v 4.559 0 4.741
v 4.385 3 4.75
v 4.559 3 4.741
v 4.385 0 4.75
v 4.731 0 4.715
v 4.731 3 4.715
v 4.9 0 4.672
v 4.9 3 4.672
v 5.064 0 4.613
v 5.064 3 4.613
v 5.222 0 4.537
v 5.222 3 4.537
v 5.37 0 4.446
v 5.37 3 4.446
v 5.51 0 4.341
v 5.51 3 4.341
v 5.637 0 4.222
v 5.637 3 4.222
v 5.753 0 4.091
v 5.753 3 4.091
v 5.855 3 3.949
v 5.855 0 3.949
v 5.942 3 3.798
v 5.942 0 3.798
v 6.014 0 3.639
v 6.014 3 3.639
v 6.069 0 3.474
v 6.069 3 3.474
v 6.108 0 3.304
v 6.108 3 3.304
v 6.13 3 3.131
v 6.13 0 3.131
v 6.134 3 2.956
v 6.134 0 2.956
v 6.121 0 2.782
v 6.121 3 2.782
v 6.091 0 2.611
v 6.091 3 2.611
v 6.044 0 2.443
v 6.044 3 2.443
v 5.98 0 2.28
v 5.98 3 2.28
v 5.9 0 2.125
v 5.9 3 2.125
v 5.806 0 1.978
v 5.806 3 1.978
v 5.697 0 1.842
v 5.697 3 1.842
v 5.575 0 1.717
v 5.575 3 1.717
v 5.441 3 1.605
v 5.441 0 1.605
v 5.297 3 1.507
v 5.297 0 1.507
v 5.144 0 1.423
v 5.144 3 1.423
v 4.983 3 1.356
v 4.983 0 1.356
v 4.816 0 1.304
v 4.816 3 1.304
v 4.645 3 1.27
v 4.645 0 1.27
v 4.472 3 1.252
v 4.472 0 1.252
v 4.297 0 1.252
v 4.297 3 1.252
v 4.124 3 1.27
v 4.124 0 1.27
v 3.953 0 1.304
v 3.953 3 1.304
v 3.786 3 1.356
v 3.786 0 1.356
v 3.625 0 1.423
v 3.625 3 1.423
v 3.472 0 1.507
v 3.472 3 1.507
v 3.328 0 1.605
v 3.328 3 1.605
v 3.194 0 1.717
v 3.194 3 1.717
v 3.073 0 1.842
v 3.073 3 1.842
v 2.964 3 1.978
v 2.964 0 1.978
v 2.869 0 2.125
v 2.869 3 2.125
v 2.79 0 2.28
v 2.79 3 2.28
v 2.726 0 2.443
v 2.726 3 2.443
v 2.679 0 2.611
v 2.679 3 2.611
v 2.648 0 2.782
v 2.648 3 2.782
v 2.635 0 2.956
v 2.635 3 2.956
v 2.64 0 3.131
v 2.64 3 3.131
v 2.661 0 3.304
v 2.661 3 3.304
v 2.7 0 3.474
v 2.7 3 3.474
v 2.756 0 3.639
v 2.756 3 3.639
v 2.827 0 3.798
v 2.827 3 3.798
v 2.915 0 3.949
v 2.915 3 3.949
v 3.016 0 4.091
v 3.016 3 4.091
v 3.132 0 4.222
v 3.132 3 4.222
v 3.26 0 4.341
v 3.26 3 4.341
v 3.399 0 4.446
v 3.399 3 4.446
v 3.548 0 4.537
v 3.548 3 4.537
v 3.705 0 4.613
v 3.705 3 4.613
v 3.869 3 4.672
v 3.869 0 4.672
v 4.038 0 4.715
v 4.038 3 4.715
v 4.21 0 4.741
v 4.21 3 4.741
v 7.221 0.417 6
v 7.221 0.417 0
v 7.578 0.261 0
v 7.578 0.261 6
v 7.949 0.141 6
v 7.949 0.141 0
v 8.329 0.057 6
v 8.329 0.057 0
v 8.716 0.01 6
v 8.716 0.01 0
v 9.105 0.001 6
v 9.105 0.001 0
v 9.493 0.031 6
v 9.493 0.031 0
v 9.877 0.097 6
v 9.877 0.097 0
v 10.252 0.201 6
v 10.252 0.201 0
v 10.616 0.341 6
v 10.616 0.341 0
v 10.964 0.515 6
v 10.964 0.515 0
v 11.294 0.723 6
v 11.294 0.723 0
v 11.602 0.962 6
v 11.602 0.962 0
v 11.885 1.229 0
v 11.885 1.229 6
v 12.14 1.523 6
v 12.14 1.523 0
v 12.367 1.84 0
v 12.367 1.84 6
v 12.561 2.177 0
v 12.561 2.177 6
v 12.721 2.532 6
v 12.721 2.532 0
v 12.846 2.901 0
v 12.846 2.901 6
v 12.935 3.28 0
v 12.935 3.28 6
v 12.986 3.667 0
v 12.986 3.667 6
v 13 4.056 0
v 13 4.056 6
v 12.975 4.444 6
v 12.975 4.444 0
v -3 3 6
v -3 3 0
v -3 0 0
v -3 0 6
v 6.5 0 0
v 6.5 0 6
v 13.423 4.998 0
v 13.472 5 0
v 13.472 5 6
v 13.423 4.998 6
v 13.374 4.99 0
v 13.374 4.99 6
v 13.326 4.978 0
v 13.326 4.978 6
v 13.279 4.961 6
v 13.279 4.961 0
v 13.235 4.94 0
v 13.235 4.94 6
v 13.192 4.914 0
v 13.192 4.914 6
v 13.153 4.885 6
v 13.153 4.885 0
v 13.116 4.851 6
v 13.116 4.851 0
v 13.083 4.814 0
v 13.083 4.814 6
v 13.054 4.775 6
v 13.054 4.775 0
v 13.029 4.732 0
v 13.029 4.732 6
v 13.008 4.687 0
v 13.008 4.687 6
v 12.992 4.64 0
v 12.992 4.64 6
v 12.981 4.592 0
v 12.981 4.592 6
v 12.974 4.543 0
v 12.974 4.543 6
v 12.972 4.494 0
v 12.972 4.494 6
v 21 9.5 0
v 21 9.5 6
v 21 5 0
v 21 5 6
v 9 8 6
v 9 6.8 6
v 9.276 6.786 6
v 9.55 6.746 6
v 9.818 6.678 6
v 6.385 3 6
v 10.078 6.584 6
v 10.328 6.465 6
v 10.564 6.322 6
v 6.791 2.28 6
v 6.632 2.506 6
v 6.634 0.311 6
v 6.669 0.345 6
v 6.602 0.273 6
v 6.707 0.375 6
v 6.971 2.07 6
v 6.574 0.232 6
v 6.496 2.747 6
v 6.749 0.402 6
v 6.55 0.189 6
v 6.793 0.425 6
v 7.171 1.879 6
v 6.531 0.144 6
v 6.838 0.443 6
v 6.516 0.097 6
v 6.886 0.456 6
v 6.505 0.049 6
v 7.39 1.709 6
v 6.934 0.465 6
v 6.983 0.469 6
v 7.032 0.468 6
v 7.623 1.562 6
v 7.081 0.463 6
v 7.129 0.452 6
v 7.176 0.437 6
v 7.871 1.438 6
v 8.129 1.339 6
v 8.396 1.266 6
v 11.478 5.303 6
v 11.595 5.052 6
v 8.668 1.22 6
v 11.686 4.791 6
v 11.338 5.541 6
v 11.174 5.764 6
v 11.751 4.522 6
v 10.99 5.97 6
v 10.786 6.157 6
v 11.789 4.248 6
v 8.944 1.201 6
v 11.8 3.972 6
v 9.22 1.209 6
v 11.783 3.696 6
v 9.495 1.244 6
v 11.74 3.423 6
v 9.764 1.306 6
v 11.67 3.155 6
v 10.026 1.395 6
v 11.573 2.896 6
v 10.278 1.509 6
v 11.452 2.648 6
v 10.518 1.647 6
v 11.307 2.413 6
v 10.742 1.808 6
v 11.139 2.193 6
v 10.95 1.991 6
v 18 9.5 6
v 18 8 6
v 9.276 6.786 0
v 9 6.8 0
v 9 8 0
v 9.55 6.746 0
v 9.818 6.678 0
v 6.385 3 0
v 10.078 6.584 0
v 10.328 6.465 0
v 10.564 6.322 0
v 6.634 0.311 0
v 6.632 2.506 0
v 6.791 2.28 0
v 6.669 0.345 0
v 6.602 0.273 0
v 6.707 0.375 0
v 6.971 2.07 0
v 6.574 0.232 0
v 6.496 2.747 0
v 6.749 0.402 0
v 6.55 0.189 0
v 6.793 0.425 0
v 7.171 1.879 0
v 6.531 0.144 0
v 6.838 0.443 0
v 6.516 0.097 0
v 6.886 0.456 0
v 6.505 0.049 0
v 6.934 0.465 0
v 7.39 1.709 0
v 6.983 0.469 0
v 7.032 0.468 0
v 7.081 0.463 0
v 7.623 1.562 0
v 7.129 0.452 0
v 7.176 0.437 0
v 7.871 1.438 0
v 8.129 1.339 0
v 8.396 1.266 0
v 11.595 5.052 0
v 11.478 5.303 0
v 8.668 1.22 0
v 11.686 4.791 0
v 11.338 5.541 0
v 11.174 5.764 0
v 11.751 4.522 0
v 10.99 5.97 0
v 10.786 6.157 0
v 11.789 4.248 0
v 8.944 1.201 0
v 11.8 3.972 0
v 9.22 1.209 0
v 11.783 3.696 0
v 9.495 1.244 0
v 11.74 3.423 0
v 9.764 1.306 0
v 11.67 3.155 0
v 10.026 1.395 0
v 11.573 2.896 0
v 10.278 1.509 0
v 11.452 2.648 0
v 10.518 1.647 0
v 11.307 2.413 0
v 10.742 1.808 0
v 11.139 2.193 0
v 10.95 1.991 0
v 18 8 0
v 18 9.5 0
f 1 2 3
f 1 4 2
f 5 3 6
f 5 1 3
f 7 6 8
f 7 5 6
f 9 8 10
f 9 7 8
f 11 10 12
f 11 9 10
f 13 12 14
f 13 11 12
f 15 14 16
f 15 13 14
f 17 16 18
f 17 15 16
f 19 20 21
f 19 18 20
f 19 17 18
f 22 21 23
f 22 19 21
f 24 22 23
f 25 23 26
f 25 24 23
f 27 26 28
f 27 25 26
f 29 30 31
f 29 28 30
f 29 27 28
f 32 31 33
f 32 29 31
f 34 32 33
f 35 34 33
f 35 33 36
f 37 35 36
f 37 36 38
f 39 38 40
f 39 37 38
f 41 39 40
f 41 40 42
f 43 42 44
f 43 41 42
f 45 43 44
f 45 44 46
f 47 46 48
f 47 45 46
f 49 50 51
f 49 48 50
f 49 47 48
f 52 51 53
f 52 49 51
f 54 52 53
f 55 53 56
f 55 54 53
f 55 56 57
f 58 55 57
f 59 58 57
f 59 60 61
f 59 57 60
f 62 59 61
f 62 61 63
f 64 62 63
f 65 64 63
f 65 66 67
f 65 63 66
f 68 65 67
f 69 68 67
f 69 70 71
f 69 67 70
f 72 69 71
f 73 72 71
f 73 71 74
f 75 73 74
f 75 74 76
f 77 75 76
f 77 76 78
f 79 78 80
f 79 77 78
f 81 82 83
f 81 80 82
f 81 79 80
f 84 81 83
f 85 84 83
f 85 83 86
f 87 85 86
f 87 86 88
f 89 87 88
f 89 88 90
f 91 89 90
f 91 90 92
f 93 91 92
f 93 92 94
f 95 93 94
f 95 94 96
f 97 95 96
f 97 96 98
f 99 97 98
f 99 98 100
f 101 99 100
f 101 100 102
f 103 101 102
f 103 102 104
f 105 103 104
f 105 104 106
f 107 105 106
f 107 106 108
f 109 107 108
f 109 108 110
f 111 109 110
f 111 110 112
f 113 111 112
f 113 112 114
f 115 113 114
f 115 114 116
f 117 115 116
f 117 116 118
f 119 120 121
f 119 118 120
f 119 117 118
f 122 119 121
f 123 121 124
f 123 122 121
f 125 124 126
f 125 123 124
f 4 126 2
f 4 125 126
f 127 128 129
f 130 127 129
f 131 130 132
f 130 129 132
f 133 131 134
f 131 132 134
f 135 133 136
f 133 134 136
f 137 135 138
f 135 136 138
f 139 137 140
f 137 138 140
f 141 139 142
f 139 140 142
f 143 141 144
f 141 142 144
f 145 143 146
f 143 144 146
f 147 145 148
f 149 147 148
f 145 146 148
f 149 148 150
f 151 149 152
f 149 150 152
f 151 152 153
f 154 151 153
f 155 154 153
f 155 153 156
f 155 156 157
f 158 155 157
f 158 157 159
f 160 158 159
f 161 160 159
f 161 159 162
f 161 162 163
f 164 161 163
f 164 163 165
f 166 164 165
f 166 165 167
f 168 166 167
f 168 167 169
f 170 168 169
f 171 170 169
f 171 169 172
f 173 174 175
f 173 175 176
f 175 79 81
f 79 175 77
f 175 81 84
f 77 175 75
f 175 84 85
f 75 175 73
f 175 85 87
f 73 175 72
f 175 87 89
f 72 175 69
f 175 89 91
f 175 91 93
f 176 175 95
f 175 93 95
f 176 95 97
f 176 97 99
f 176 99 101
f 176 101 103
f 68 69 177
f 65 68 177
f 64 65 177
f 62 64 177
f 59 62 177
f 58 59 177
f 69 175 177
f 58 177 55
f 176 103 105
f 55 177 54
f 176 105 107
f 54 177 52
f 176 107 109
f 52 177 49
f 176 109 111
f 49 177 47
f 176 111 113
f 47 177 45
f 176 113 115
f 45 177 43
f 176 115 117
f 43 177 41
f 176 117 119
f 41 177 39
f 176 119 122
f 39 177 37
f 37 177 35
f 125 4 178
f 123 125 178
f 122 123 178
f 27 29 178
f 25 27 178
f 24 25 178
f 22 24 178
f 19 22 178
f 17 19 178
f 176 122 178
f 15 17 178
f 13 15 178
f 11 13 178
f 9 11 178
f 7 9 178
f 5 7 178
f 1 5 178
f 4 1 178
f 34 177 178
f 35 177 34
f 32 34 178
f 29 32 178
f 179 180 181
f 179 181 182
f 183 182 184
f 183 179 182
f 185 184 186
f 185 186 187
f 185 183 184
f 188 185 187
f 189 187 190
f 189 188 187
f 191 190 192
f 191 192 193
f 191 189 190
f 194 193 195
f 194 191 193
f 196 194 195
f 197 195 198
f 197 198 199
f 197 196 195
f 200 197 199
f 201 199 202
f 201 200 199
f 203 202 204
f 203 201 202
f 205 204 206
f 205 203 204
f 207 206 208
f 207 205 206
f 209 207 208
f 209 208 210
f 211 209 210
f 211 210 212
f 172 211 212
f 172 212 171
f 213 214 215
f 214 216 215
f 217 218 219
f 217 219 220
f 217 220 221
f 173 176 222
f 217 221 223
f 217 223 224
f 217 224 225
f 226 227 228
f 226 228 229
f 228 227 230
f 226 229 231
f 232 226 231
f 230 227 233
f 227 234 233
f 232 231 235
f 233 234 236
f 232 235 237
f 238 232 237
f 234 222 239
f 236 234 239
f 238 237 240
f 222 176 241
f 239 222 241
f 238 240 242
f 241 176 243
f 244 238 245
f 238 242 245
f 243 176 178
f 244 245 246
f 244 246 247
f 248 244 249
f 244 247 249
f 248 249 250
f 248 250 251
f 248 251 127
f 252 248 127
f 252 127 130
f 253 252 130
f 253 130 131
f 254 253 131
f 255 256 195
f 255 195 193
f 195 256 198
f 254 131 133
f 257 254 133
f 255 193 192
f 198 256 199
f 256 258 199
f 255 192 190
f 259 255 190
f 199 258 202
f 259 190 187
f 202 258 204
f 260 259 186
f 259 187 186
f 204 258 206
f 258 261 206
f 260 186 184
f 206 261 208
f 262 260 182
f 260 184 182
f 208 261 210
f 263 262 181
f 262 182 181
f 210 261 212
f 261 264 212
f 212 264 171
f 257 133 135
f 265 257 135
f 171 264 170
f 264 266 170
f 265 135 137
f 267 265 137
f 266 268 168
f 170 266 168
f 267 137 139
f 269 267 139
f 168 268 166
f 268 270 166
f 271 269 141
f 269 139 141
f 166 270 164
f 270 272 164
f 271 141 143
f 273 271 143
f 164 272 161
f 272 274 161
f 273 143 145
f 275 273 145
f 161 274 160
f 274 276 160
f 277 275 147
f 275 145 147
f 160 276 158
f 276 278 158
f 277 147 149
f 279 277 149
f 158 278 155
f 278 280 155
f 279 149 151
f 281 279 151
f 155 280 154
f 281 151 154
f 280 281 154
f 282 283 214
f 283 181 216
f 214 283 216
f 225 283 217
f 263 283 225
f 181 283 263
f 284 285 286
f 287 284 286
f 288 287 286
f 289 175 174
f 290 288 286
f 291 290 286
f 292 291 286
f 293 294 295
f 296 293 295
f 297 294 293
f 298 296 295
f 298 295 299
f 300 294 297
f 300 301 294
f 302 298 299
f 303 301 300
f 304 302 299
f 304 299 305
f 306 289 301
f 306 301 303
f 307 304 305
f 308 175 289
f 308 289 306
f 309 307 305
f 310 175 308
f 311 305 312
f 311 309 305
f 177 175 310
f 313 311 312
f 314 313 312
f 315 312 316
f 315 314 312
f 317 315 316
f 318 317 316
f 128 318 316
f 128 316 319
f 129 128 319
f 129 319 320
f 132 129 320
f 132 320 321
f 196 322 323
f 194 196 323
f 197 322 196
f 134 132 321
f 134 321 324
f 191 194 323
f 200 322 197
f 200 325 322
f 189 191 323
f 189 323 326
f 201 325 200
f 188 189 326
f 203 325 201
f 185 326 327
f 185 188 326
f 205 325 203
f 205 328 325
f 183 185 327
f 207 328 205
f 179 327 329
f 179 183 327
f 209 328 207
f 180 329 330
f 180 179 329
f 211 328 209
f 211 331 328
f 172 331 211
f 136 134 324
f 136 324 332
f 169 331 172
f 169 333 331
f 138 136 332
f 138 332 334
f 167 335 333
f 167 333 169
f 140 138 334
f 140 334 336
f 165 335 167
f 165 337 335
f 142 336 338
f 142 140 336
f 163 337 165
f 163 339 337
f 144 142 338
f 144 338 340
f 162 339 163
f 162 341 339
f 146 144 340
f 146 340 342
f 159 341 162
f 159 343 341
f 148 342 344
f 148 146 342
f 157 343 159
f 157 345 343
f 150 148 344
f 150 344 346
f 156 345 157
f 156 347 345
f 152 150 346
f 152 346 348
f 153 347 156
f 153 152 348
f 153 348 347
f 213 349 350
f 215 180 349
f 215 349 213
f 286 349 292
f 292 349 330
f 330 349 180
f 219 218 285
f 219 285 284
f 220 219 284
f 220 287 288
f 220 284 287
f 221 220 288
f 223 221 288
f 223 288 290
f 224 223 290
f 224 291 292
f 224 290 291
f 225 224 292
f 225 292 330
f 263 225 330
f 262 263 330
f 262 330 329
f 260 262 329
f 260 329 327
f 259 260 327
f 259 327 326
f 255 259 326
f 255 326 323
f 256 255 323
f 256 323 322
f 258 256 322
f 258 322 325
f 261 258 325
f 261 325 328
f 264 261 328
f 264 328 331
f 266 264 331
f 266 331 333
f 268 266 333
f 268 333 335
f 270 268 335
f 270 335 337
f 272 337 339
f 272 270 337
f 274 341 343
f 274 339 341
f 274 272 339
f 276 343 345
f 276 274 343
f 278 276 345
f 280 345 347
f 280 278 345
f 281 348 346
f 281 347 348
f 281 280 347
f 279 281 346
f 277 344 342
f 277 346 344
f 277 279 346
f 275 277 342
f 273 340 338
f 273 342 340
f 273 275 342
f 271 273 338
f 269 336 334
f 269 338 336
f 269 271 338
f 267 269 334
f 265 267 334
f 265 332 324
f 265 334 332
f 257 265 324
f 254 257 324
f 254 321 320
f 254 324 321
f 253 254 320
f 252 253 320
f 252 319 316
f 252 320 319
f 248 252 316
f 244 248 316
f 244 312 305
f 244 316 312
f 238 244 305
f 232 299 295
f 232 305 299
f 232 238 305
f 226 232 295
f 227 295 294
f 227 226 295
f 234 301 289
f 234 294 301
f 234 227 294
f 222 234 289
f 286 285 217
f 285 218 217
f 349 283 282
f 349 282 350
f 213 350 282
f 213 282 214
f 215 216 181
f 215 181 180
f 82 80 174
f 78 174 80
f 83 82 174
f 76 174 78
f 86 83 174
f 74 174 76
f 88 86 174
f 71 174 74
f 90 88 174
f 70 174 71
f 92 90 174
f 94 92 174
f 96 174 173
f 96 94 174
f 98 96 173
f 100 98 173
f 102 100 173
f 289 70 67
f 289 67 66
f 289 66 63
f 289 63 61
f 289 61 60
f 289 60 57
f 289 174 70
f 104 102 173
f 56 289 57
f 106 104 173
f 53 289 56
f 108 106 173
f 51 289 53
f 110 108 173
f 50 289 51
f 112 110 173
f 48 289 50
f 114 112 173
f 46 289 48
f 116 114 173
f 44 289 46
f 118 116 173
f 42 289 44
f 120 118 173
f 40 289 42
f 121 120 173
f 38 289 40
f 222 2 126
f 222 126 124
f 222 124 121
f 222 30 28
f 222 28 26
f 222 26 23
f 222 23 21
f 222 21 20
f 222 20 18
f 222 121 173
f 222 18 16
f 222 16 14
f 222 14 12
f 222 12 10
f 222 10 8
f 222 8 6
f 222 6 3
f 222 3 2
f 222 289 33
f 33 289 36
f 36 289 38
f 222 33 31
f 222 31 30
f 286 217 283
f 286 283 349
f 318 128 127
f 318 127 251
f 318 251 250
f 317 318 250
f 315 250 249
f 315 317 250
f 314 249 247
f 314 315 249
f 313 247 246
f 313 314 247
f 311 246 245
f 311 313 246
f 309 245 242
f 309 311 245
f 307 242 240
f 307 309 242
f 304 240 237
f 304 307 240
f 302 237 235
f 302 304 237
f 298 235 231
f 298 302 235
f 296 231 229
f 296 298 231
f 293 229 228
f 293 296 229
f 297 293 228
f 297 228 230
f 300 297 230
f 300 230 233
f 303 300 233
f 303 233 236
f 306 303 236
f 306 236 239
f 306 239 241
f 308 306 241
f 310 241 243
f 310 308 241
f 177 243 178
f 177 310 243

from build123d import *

# Parameters (mm, degrees)
ESBO_O1_R                  = 4
ESBO_O1_W                  = 6.5
ESBO_O1_H                  = 3
EXTRUDE1_CORPO_DEPTH       = 6
FURO_ANEL_DEPTH            = 21.591260282
FURO_ANEL_DEPTH_BACK       = 21.591260282
ESBO_O2_R                  = 2.8
ABERTURA_C_DEPTH           = 21.591260282
ABERTURA_C_DEPTH_BACK      = 21.591260282
ESBO_O3_W                  = 6
ESBO_O3_H                  = 6
FILLET_JUNCOES_R           = 0.5
ESBO_O4_W                  = 6
ESBO_O4_H                  = 3
RESSALTO_EXTRUS_O2_DEPTH   = 3
ESBO_O5_W                  = 6
ESBO_O5_H                  = 3
RESSALTO_EXTRUS_O3_DEPTH   = 3
ESBO_O6_W                  = 3
ESBO_O6_H                  = 6
RESSALTO_EXTRUS_O4_DEPTH   = 1.5
CORTE_EXTRUS_O3_DEPTH      = 23.78705773
CORTE_EXTRUS_O3_DEPTH_BACK = 23.78705773
ESBO_O7_R                  = 1.75


with BuildPart() as part:
    # Esboço1 → Extrude1_Corpo (new body)
    with BuildSketch(Plane.XY):
        with BuildLine():
            ThreePointArc((5.127016654, 3), (5.6414319, 1.827439226), (6.5, 0.877501001))
            Line((6.5, 0.877501001), (6.5, 3))
            Line((6.5, 3), (5.127016654, 3))
        make_face()
        with BuildLine():
            ThreePointArc((12.872983346, 5), (11.449489743, 7.16227766), (9, 8))
            Line((9, 8), (9, 5))
            Line((9, 5), (12.872983346, 5))
        make_face()
        with Locations((9, 4)):
            Circle(ESBO_O1_R)
        with Locations((3.25, 1.5)):
            Rectangle(ESBO_O1_W, ESBO_O1_H)
        with BuildLine():
            Line((18, 8), (9, 8))
            ThreePointArc((9, 8), (11.449489743, 7.16227766), (12.872983346, 5))
            Line((12.872983346, 5), (18, 5))
            Line((18, 5), (18, 8))
        make_face()
        with BuildLine():
            Line((6.5, 3), (6.5, 0.877501001))
            ThreePointArc((6.5, 0.877501001), (10.732050808, 0.394448725), (13, 4))
            ThreePointArc((13, 4), (12.968118785, 4.50401717), (12.872983346, 5))
            Line((12.872983346, 5), (9, 5))
            Line((9, 5), (9, 8))
            ThreePointArc((9, 8), (5.83772234, 6.449489743), (5.127016654, 3))
            Line((5.127016654, 3), (6.5, 3))
        make_face()
    extrude(amount=EXTRUDE1_CORPO_DEPTH)

    # Esboço2 → Furo_Anel (cut, two sides: drawn at the far end of the back side and taken through both)
    with BuildSketch(Plane(origin=(0, 0, 0), x_dir=(-1, 0, 0), z_dir=(0, 0, -1)).offset(-FURO_ANEL_DEPTH_BACK)):
        with Locations((-9, 4)):
            Circle(ESBO_O2_R)
    extrude(amount=FURO_ANEL_DEPTH + FURO_ANEL_DEPTH_BACK, mode=Mode.SUBTRACT)

    # Esboço3 → Abertura_C (cut, two sides: drawn at the far end of the back side and taken through both)
    with BuildSketch(Plane(origin=(0, 0, 0), x_dir=(-1, 0, 0), z_dir=(0, 0, -1)).offset(-ABERTURA_C_DEPTH_BACK)):
        with Locations((-6, 6)):
            Rectangle(ESBO_O3_W, ESBO_O3_H)
    extrude(amount=ABERTURA_C_DEPTH + ABERTURA_C_DEPTH_BACK, mode=Mode.SUBTRACT)

    # Fillet_Juncoes
    # the kernel refuses this fillet: 0.5 mm, written as the material it adds along each edge
    with BuildSketch(Plane(origin=(12.872983346, 5, 0), x_dir=(1, 0, 0), z_dir=(0, 0, 1))) as fillet_juncoes_piece_1:
        with BuildLine():
            CenterArc((0.599152609, -0.5), FILLET_JUNCOES_R, 90, 96.379370208)
            Line((0.102248614, -0.555555556), (0.092310534, -0.556666667))
            ThreePointArc((0.092310534, -0.556666667), (0.051108802, -0.277780632), (-0.009682458, -0.0025))
            Line((-0.009682458, -0.0025), (0, 0.01))
            Line((0, 0.01), (0.599152609, 0.01))
            Line((0.599152609, 0.01), (0.599152609, 0))
        make_face()
    extrude(amount=6)
    with BuildSketch(Plane(origin=(6.5, 0.877501001, 0), x_dir=(0.8430003462487853, -0.5379130191995991, 0), z_dir=(0, 0, 1))) as fillet_juncoes_piece_2:
        with BuildLine():
            CenterArc((0.909219503, -0.497131286), FILLET_JUNCOES_R, 96.140505738, 112.885380476)
            Line((0.472019213, -0.739733648), (0.463275207, -0.744585695))
            ThreePointArc((0.463275207, -0.744585695), (0.227579603, -0.375245954), (-0.008430003, -0.00537913))
            Line((-0.008430003, -0.00537913), (0.00106967, 0.009942626))
            ThreePointArc((0.00106967, 0.009942626), (0.427868002, -0.012949715), (0.854666333, 0.009942626))
            Line((0.854666333, 0.009942626), (0.855736003, 0))
        make_face()
    extrude(amount=6)

    # Esboço4 → Ressalto-extrusão2 (add)
    with BuildSketch(Plane.ZY):
        with Locations((3, 1.5)):
            Rectangle(ESBO_O4_W, ESBO_O4_H)
    extrude(amount=RESSALTO_EXTRUS_O2_DEPTH)



with BuildPart() as body_2:
    # Esboço5 → Ressalto-extrusão3 (new body)
    with BuildSketch(Plane(origin=(18, 0, 0), x_dir=(0, 0, -1), z_dir=(1, 0, 0))):
        with Locations((-3, 6.5)):
            Rectangle(ESBO_O5_W, ESBO_O5_H)
    extrude(amount=RESSALTO_EXTRUS_O3_DEPTH)


with BuildPart() as part_1:
    add(part.part)

    add(body_2.part)  # Ressalto-extrusão4 merges body 2
    # Esboço6 → Ressalto-extrusão4 (add)
    with BuildSketch(Plane(origin=(0, 8, 0), x_dir=(1, 0, 0), z_dir=(0, 1, 0))):
        with Locations((19.5, -3)):
            Rectangle(ESBO_O6_W, ESBO_O6_H)
    extrude(amount=RESSALTO_EXTRUS_O4_DEPTH)

    # Esboço7 → Corte-extrusão3 (cut, two sides: drawn at the far end of the back side and taken through both)
    with BuildSketch(Plane(origin=(0, 3, 0), x_dir=(1, 0, 0), z_dir=(0, 1, 0)).offset(-CORTE_EXTRUS_O3_DEPTH_BACK)):
        with Locations(Location((4.384660634, -3, 0), (0, 0, 270))):
            Circle(ESBO_O7_R)
    extrude(amount=CORTE_EXTRUS_O3_DEPTH + CORTE_EXTRUS_O3_DEPTH_BACK, mode=Mode.SUBTRACT)


solid = part_1.part
